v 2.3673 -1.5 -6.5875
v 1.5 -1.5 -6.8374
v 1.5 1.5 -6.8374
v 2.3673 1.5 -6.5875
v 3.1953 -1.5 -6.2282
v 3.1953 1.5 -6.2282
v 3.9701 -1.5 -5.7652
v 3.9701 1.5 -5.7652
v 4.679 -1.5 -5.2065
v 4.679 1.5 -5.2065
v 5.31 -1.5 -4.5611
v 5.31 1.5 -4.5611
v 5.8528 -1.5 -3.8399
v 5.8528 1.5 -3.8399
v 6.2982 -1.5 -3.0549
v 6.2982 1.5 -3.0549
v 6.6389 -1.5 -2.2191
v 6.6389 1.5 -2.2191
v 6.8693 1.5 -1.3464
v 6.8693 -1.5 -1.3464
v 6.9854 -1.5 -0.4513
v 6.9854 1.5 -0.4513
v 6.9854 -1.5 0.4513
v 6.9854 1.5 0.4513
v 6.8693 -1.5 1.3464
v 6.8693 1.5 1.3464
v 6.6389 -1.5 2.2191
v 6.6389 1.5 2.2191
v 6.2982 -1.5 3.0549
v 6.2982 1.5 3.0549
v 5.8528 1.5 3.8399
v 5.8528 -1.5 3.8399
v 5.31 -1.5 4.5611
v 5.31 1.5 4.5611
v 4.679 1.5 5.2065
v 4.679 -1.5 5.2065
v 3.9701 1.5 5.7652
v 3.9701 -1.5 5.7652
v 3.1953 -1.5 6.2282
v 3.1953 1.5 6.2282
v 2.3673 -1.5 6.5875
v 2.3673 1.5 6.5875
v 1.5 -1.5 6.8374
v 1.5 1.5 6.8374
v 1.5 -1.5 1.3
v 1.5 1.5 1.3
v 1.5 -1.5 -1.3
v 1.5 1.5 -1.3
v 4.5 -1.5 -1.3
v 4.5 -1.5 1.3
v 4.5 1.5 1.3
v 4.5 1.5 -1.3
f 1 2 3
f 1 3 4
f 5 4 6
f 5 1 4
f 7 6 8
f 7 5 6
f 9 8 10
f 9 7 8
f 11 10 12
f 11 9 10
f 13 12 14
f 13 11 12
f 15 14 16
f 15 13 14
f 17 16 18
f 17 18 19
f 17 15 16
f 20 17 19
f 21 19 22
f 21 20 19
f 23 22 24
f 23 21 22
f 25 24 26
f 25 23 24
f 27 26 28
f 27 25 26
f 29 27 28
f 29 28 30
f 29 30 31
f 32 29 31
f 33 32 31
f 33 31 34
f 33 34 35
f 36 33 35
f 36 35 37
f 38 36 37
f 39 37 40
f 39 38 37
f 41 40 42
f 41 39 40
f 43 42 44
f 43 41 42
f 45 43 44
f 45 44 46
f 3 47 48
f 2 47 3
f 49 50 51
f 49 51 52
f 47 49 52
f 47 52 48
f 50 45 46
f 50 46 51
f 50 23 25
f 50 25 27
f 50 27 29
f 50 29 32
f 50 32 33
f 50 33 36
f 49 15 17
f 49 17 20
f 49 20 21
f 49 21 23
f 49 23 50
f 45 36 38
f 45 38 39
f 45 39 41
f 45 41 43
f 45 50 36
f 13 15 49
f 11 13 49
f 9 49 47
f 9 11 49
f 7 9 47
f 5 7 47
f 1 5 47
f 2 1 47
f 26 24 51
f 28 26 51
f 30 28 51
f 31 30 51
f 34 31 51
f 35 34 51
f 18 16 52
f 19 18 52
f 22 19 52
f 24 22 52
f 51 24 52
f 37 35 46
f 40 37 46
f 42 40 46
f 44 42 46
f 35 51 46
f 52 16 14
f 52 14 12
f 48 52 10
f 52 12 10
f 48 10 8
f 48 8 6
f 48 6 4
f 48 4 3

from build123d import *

# Parameters (mm, degrees)
BOSS_EXTRUDE1_DEPTH      = 1.5
BOSS_EXTRUDE1_DEPTH_BACK = 1.5


with BuildPart() as part:
    # Sketch1 → Boss-Extrude1 (new, two sides: drawn at the far end of the back side and taken through both)
    with BuildSketch(Plane(origin=(0, 0, 0), x_dir=(1, 0, 0), z_dir=(0, 1, 0)).offset(-BOSS_EXTRUDE1_DEPTH_BACK)):
        with BuildLine():
            Line((1.5, -6.837397166), (1.5, -1.3))
            Line((1.5, -1.3), (4.5, -1.3))
            Line((4.5, -1.3), (4.5, 1.3))
            Line((4.5, 1.3), (1.5, 1.3))
            Line((1.5, 1.3), (1.5, 6.837397166))
            ThreePointArc((1.5, 6.837397166), (7, 0), (1.5, -6.837397166))
        make_face()
    extrude(amount=BOSS_EXTRUDE1_DEPTH + BOSS_EXTRUDE1_DEPTH_BACK)


solid = part.part
